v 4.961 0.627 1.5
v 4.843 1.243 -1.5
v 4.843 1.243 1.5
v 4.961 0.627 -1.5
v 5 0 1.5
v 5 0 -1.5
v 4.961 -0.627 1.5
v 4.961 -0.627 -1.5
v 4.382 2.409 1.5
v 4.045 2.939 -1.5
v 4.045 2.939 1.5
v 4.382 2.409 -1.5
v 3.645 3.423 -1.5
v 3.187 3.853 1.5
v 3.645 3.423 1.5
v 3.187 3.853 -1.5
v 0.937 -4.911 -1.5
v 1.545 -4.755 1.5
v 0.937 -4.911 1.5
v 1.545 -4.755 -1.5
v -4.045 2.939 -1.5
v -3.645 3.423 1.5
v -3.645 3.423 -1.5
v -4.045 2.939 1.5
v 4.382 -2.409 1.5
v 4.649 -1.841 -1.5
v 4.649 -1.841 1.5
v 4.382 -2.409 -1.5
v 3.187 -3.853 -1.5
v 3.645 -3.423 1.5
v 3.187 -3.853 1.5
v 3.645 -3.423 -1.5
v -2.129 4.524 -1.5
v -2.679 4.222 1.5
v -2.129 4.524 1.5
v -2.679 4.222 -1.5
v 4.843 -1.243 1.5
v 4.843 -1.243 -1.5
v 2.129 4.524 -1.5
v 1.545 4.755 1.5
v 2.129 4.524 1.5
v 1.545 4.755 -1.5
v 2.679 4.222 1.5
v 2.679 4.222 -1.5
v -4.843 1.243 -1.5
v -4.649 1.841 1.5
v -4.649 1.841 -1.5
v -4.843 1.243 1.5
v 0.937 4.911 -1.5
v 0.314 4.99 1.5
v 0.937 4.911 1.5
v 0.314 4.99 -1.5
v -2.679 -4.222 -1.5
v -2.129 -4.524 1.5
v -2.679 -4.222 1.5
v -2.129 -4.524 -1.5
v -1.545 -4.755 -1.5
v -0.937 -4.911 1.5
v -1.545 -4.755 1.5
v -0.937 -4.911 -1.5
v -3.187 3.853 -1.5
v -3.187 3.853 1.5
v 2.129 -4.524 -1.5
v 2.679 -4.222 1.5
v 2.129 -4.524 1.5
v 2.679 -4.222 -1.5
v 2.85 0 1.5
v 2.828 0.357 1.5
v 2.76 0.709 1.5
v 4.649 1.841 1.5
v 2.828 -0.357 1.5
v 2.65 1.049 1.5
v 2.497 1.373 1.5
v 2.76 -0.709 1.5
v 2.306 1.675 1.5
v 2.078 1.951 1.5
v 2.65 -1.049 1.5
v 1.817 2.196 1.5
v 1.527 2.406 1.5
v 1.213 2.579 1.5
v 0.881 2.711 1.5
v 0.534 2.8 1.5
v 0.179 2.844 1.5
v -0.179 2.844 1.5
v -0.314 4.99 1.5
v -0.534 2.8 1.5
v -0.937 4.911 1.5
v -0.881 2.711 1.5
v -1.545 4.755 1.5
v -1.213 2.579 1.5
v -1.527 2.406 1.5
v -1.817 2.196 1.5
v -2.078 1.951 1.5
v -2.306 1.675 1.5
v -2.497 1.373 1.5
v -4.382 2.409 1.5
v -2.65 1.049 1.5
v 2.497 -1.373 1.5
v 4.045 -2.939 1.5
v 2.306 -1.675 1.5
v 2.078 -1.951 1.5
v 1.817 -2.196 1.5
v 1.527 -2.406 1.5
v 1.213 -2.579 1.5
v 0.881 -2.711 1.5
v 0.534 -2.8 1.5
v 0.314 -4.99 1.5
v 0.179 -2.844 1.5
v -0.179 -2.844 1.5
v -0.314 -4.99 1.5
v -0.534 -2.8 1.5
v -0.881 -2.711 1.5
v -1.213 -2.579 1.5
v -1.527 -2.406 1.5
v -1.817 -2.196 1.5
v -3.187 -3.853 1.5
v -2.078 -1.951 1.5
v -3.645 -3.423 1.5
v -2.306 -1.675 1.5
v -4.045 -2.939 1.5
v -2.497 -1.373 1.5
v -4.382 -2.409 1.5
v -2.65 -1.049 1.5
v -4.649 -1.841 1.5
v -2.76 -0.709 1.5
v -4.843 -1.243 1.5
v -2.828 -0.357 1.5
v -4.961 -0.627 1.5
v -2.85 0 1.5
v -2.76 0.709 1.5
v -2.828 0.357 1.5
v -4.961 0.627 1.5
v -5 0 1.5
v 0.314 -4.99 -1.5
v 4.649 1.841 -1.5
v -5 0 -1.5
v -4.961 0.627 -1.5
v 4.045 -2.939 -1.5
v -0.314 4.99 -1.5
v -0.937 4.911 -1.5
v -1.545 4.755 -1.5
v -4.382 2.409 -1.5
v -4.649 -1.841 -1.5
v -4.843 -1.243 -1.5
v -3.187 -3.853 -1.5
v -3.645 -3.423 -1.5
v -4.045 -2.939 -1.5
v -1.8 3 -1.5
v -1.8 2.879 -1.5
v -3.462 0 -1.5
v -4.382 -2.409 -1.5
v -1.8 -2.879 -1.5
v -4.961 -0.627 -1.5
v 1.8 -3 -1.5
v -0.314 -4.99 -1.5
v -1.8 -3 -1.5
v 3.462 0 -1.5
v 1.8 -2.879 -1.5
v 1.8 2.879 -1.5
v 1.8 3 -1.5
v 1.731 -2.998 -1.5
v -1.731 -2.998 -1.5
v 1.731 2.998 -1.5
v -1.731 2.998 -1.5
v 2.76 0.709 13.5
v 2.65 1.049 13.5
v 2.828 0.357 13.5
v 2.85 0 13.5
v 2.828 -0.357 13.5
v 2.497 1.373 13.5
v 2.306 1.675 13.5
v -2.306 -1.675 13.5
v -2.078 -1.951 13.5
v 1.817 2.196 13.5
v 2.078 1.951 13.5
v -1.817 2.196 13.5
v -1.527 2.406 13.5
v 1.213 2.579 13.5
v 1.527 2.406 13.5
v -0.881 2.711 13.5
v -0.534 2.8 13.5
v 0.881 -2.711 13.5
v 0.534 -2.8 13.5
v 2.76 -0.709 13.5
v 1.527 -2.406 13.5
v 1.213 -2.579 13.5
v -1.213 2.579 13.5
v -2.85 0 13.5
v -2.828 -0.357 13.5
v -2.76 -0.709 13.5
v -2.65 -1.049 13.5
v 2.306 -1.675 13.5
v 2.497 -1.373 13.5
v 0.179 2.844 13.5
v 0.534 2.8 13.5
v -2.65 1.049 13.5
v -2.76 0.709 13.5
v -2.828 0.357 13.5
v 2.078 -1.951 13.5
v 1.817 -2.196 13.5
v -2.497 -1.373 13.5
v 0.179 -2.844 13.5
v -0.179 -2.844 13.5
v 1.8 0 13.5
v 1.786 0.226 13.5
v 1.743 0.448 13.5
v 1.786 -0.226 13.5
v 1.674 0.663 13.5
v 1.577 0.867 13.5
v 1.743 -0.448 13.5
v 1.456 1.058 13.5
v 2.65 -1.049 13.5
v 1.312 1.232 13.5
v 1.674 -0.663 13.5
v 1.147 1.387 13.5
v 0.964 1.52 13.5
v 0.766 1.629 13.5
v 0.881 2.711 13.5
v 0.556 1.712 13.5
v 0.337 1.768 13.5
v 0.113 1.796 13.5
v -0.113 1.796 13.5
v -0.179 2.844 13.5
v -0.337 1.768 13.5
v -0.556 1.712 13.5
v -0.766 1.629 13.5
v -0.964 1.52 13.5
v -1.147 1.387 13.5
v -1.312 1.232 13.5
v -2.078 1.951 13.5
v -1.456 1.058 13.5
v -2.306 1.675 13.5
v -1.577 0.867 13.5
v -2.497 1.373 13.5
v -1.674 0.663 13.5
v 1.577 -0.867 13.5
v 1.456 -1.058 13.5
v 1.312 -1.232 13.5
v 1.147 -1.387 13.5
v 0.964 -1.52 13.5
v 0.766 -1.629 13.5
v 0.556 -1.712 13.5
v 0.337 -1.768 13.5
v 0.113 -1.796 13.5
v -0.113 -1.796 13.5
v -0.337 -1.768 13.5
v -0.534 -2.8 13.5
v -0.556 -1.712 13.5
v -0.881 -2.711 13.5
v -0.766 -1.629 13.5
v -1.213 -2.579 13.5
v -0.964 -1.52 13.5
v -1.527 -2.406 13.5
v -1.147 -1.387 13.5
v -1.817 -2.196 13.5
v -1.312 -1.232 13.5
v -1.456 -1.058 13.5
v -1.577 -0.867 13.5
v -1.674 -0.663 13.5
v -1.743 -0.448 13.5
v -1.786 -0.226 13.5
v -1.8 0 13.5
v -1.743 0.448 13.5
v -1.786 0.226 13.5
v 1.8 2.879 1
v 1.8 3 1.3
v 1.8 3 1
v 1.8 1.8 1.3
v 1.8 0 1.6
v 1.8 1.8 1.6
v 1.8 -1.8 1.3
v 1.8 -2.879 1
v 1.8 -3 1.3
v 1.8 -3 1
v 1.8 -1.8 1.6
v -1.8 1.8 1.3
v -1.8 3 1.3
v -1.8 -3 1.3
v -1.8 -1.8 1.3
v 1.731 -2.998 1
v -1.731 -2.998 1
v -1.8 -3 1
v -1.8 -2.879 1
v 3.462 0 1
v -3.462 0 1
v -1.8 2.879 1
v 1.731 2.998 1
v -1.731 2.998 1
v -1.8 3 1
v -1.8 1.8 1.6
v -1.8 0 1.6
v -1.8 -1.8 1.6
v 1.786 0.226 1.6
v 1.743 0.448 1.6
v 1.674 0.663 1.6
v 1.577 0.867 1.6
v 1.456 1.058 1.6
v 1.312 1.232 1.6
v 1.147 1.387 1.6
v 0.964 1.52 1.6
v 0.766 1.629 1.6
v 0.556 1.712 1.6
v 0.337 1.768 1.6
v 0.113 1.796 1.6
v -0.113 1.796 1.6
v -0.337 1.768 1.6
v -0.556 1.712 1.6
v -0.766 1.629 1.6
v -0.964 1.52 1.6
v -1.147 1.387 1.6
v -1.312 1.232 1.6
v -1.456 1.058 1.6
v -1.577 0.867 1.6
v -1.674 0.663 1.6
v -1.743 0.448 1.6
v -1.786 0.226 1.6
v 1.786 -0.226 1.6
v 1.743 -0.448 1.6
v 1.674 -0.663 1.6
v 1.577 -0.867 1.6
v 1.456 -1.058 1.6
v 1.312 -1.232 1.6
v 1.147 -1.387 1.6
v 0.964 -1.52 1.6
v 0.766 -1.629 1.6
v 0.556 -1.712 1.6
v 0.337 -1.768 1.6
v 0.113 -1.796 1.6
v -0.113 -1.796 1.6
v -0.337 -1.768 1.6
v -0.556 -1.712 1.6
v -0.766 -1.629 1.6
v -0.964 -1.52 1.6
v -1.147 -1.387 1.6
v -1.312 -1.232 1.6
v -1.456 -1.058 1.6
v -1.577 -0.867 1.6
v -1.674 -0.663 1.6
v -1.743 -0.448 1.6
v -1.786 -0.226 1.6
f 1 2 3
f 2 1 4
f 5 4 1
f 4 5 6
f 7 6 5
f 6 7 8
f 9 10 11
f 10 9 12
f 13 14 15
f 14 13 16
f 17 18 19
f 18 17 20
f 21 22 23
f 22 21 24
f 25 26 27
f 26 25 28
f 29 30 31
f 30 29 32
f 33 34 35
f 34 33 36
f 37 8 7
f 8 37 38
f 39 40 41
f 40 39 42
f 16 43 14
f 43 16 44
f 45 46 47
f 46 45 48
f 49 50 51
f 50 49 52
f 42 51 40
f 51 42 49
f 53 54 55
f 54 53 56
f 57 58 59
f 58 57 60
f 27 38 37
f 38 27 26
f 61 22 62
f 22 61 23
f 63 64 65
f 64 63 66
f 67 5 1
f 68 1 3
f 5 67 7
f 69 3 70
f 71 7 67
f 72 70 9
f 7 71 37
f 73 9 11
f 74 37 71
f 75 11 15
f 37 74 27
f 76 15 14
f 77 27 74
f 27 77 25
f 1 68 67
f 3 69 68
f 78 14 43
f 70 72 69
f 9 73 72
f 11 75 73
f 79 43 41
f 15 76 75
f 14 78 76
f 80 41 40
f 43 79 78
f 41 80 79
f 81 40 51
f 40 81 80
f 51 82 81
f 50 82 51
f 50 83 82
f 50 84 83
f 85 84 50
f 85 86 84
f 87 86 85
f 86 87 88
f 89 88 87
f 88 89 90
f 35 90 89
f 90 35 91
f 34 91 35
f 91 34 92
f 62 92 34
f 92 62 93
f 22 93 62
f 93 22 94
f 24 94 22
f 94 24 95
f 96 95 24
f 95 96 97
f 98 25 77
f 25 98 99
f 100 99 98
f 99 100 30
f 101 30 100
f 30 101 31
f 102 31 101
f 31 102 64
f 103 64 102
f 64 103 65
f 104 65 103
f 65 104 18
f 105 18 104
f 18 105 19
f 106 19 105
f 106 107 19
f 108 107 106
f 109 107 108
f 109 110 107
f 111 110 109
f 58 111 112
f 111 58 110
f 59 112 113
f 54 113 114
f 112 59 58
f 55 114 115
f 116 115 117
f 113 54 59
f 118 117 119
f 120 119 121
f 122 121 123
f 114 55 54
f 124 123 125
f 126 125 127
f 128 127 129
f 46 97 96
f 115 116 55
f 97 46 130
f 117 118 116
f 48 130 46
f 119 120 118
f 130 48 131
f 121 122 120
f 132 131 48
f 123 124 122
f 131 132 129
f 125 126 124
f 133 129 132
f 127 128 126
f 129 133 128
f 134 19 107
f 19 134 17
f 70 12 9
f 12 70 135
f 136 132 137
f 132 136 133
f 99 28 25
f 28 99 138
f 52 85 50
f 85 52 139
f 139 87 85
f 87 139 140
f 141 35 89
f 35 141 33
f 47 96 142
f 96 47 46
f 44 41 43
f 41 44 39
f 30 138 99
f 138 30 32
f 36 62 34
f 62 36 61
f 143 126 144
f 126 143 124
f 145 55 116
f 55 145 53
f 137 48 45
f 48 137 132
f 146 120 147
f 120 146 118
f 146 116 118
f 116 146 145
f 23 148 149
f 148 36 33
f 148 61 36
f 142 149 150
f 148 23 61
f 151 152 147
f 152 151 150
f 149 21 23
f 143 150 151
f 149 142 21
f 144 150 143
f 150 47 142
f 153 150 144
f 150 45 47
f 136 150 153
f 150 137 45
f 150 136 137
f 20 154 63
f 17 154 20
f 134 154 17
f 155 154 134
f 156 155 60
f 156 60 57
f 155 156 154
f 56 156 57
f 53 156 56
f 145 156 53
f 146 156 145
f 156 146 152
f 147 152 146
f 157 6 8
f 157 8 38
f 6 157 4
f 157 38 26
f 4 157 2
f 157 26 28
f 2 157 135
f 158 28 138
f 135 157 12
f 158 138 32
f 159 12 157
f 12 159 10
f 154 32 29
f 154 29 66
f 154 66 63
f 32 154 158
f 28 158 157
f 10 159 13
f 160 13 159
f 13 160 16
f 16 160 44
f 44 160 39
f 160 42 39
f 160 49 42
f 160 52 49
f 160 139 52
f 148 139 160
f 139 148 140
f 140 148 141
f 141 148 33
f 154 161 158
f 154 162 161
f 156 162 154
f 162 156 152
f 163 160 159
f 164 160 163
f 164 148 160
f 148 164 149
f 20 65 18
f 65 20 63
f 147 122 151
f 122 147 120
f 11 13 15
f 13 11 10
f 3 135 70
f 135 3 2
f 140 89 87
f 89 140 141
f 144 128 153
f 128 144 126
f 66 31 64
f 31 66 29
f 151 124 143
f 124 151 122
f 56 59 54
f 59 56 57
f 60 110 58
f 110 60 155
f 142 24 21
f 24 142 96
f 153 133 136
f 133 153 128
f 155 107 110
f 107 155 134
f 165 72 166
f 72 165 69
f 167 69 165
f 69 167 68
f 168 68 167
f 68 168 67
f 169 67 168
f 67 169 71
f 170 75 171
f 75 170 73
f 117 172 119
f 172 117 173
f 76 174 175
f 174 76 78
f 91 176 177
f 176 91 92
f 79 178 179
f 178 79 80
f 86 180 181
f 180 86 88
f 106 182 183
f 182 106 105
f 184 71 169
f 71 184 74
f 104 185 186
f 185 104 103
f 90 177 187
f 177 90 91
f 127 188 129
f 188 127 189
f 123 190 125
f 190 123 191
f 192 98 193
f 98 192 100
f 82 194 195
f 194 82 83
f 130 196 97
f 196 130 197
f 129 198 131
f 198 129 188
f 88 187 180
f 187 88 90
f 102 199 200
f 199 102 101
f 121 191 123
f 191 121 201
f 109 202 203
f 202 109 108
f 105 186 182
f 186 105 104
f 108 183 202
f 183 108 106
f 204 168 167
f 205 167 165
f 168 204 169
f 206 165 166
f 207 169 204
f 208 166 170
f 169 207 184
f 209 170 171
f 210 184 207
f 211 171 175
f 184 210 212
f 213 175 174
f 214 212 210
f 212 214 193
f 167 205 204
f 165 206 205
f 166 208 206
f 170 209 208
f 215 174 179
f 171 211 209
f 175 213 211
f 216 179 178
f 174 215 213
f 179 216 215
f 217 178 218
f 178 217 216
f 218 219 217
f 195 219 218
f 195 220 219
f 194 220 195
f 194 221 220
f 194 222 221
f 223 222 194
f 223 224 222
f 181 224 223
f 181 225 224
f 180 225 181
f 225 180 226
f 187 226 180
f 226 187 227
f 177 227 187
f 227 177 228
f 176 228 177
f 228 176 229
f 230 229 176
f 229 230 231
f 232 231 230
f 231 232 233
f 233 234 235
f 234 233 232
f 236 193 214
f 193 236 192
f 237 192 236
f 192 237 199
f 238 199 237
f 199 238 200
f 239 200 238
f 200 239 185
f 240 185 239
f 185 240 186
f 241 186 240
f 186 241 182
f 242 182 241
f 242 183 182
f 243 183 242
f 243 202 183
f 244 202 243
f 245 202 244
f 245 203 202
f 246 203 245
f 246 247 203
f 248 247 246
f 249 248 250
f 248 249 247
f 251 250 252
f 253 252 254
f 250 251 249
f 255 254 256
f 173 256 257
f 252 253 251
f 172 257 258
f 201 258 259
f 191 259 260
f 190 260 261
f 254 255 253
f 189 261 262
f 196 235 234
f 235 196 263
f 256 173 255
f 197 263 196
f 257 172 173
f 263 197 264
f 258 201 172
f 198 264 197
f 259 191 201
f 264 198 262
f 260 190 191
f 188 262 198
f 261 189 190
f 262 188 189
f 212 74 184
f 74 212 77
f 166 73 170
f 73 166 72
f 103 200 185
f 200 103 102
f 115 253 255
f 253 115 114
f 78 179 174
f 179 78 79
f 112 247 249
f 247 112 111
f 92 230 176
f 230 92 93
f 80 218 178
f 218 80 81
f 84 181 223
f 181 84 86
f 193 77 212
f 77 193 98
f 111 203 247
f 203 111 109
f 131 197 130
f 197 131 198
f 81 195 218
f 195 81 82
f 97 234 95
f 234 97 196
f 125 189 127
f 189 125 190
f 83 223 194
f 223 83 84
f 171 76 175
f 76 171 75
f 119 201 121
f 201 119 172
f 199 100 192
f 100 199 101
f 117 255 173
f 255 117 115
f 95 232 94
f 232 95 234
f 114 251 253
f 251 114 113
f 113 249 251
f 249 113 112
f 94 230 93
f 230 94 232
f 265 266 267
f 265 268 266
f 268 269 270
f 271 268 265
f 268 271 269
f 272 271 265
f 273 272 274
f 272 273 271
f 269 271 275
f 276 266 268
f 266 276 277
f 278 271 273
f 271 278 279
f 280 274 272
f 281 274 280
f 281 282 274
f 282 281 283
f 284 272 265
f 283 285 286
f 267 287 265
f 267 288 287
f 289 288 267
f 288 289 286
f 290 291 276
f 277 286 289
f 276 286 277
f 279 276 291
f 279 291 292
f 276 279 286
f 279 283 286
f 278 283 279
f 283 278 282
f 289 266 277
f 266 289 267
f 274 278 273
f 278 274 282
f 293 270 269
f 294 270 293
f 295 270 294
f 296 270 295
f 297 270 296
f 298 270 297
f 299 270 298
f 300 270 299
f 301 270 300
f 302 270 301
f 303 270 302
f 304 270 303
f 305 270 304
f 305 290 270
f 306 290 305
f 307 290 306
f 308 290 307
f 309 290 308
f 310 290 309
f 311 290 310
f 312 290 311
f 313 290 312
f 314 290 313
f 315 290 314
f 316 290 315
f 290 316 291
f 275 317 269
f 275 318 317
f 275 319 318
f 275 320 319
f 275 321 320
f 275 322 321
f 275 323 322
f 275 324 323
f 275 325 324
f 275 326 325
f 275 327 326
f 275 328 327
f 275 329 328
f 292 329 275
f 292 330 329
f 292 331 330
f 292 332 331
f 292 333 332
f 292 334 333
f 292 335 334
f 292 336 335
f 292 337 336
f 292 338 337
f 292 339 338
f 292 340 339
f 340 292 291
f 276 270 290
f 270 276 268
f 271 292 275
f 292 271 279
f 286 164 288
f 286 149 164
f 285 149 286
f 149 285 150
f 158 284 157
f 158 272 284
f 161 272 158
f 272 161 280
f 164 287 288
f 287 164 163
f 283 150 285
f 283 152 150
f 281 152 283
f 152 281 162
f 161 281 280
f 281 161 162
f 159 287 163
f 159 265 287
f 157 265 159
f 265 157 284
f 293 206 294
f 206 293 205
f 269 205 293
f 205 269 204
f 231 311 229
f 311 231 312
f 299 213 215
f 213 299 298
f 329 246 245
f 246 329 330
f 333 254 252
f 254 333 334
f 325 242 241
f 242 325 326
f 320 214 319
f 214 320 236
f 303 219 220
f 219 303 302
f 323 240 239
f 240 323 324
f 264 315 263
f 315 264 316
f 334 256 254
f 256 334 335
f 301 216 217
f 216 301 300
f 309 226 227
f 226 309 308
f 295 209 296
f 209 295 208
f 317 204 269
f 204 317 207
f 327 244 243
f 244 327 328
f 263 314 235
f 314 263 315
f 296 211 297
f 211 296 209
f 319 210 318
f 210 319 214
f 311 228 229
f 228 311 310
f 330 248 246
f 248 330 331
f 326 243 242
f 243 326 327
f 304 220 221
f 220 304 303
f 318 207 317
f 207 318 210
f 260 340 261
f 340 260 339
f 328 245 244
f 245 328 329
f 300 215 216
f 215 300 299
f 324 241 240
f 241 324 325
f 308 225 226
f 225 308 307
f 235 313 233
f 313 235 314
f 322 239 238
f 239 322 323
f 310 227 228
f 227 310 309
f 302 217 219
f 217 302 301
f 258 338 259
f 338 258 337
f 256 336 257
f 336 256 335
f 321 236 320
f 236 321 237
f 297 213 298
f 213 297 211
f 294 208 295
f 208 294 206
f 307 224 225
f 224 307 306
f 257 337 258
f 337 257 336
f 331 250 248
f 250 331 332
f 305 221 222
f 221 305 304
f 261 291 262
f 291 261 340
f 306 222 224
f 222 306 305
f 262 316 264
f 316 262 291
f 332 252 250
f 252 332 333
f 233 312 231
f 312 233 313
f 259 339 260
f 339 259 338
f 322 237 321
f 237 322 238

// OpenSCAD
$fn = 50;


difference() {
	union() {
		translate(v = [0, 0, -1.5000000000]) {
			cylinder(h = 3, r = 5.0000000000);
		}
		translate(v = [0, 0, -1.5000000000]) {
			cylinder(h = 15, r = 2.8500000000);
		}
	}
	union() {
		translate(v = [0, 0, -1.5000000000]) {
			rotate(a = [0, 0, 0]) {
				difference() {
					union() {
						translate(v = [-1.8000000000, -3.0000000000, -0.3000000000]) {
							cube(size = [3.6000000000, 6.0000000000, 0.3000000000]);
						}
						translate(v = [-1.8000000000, -1.8000000000, -0.6000000000]) {
							cube(size = [3.6000000000, 3.6000000000, 0.3000000000]);
						}
						translate(v = [-1.8000000000, -3.0000000000, 2.5000000000]) {
							cube(size = [3.6000000000, 6.0000000000, 0.3000000000]);
						}
						translate(v = [-1.8000000000, -1.8000000000, 2.8000000000]) {
							cube(size = [3.6000000000, 3.6000000000, 0.3000000000]);
						}
						linear_extrude(height = 2.5000000000) {
							polygon(points = [[3.4620000000, 0.0000000000], [1.7310000000, 2.9981799479], [-1.7310000000, 2.9981799479], [-3.4620000000, 0.0000000000], [-1.7310000000, -2.9981799479], [1.7310000000, -2.9981799479]]);
						}
						translate(v = [-1.8000000000, -3.0000000000, -0.3000000000]) {
							cube(size = [3.6000000000, 6.0000000000, 0.3000000000]);
						}
						translate(v = [-1.8000000000, -1.8000000000, -0.6000000000]) {
							cube(size = [3.6000000000, 3.6000000000, 0.3000000000]);
						}
						translate(v = [-1.8000000000, -3.0000000000, 2.5000000000]) {
							cube(size = [3.6000000000, 6.0000000000, 0.3000000000]);
						}
						translate(v = [-1.8000000000, -1.8000000000, 2.8000000000]) {
							cube(size = [3.6000000000, 3.6000000000, 0.3000000000]);
						}
						translate(v = [-1.8000000000, -3.0000000000, -0.3000000000]) {
							cube(size = [3.6000000000, 6.0000000000, 0.3000000000]);
						}
						translate(v = [-1.8000000000, -1.8000000000, -0.6000000000]) {
							cube(size = [3.6000000000, 3.6000000000, 0.3000000000]);
						}
						translate(v = [-1.8000000000, -3.0000000000, 2.5000000000]) {
							cube(size = [3.6000000000, 6.0000000000, 0.3000000000]);
						}
						translate(v = [-1.8000000000, -1.8000000000, 2.8000000000]) {
							cube(size = [3.6000000000, 3.6000000000, 0.3000000000]);
						}
					}
					union();
				}
			}
		}
		translate(v = [0, 0, -50.0000000000]) {
			cylinder(h = 100, r = 1.8000000000);
		}
	}
}
